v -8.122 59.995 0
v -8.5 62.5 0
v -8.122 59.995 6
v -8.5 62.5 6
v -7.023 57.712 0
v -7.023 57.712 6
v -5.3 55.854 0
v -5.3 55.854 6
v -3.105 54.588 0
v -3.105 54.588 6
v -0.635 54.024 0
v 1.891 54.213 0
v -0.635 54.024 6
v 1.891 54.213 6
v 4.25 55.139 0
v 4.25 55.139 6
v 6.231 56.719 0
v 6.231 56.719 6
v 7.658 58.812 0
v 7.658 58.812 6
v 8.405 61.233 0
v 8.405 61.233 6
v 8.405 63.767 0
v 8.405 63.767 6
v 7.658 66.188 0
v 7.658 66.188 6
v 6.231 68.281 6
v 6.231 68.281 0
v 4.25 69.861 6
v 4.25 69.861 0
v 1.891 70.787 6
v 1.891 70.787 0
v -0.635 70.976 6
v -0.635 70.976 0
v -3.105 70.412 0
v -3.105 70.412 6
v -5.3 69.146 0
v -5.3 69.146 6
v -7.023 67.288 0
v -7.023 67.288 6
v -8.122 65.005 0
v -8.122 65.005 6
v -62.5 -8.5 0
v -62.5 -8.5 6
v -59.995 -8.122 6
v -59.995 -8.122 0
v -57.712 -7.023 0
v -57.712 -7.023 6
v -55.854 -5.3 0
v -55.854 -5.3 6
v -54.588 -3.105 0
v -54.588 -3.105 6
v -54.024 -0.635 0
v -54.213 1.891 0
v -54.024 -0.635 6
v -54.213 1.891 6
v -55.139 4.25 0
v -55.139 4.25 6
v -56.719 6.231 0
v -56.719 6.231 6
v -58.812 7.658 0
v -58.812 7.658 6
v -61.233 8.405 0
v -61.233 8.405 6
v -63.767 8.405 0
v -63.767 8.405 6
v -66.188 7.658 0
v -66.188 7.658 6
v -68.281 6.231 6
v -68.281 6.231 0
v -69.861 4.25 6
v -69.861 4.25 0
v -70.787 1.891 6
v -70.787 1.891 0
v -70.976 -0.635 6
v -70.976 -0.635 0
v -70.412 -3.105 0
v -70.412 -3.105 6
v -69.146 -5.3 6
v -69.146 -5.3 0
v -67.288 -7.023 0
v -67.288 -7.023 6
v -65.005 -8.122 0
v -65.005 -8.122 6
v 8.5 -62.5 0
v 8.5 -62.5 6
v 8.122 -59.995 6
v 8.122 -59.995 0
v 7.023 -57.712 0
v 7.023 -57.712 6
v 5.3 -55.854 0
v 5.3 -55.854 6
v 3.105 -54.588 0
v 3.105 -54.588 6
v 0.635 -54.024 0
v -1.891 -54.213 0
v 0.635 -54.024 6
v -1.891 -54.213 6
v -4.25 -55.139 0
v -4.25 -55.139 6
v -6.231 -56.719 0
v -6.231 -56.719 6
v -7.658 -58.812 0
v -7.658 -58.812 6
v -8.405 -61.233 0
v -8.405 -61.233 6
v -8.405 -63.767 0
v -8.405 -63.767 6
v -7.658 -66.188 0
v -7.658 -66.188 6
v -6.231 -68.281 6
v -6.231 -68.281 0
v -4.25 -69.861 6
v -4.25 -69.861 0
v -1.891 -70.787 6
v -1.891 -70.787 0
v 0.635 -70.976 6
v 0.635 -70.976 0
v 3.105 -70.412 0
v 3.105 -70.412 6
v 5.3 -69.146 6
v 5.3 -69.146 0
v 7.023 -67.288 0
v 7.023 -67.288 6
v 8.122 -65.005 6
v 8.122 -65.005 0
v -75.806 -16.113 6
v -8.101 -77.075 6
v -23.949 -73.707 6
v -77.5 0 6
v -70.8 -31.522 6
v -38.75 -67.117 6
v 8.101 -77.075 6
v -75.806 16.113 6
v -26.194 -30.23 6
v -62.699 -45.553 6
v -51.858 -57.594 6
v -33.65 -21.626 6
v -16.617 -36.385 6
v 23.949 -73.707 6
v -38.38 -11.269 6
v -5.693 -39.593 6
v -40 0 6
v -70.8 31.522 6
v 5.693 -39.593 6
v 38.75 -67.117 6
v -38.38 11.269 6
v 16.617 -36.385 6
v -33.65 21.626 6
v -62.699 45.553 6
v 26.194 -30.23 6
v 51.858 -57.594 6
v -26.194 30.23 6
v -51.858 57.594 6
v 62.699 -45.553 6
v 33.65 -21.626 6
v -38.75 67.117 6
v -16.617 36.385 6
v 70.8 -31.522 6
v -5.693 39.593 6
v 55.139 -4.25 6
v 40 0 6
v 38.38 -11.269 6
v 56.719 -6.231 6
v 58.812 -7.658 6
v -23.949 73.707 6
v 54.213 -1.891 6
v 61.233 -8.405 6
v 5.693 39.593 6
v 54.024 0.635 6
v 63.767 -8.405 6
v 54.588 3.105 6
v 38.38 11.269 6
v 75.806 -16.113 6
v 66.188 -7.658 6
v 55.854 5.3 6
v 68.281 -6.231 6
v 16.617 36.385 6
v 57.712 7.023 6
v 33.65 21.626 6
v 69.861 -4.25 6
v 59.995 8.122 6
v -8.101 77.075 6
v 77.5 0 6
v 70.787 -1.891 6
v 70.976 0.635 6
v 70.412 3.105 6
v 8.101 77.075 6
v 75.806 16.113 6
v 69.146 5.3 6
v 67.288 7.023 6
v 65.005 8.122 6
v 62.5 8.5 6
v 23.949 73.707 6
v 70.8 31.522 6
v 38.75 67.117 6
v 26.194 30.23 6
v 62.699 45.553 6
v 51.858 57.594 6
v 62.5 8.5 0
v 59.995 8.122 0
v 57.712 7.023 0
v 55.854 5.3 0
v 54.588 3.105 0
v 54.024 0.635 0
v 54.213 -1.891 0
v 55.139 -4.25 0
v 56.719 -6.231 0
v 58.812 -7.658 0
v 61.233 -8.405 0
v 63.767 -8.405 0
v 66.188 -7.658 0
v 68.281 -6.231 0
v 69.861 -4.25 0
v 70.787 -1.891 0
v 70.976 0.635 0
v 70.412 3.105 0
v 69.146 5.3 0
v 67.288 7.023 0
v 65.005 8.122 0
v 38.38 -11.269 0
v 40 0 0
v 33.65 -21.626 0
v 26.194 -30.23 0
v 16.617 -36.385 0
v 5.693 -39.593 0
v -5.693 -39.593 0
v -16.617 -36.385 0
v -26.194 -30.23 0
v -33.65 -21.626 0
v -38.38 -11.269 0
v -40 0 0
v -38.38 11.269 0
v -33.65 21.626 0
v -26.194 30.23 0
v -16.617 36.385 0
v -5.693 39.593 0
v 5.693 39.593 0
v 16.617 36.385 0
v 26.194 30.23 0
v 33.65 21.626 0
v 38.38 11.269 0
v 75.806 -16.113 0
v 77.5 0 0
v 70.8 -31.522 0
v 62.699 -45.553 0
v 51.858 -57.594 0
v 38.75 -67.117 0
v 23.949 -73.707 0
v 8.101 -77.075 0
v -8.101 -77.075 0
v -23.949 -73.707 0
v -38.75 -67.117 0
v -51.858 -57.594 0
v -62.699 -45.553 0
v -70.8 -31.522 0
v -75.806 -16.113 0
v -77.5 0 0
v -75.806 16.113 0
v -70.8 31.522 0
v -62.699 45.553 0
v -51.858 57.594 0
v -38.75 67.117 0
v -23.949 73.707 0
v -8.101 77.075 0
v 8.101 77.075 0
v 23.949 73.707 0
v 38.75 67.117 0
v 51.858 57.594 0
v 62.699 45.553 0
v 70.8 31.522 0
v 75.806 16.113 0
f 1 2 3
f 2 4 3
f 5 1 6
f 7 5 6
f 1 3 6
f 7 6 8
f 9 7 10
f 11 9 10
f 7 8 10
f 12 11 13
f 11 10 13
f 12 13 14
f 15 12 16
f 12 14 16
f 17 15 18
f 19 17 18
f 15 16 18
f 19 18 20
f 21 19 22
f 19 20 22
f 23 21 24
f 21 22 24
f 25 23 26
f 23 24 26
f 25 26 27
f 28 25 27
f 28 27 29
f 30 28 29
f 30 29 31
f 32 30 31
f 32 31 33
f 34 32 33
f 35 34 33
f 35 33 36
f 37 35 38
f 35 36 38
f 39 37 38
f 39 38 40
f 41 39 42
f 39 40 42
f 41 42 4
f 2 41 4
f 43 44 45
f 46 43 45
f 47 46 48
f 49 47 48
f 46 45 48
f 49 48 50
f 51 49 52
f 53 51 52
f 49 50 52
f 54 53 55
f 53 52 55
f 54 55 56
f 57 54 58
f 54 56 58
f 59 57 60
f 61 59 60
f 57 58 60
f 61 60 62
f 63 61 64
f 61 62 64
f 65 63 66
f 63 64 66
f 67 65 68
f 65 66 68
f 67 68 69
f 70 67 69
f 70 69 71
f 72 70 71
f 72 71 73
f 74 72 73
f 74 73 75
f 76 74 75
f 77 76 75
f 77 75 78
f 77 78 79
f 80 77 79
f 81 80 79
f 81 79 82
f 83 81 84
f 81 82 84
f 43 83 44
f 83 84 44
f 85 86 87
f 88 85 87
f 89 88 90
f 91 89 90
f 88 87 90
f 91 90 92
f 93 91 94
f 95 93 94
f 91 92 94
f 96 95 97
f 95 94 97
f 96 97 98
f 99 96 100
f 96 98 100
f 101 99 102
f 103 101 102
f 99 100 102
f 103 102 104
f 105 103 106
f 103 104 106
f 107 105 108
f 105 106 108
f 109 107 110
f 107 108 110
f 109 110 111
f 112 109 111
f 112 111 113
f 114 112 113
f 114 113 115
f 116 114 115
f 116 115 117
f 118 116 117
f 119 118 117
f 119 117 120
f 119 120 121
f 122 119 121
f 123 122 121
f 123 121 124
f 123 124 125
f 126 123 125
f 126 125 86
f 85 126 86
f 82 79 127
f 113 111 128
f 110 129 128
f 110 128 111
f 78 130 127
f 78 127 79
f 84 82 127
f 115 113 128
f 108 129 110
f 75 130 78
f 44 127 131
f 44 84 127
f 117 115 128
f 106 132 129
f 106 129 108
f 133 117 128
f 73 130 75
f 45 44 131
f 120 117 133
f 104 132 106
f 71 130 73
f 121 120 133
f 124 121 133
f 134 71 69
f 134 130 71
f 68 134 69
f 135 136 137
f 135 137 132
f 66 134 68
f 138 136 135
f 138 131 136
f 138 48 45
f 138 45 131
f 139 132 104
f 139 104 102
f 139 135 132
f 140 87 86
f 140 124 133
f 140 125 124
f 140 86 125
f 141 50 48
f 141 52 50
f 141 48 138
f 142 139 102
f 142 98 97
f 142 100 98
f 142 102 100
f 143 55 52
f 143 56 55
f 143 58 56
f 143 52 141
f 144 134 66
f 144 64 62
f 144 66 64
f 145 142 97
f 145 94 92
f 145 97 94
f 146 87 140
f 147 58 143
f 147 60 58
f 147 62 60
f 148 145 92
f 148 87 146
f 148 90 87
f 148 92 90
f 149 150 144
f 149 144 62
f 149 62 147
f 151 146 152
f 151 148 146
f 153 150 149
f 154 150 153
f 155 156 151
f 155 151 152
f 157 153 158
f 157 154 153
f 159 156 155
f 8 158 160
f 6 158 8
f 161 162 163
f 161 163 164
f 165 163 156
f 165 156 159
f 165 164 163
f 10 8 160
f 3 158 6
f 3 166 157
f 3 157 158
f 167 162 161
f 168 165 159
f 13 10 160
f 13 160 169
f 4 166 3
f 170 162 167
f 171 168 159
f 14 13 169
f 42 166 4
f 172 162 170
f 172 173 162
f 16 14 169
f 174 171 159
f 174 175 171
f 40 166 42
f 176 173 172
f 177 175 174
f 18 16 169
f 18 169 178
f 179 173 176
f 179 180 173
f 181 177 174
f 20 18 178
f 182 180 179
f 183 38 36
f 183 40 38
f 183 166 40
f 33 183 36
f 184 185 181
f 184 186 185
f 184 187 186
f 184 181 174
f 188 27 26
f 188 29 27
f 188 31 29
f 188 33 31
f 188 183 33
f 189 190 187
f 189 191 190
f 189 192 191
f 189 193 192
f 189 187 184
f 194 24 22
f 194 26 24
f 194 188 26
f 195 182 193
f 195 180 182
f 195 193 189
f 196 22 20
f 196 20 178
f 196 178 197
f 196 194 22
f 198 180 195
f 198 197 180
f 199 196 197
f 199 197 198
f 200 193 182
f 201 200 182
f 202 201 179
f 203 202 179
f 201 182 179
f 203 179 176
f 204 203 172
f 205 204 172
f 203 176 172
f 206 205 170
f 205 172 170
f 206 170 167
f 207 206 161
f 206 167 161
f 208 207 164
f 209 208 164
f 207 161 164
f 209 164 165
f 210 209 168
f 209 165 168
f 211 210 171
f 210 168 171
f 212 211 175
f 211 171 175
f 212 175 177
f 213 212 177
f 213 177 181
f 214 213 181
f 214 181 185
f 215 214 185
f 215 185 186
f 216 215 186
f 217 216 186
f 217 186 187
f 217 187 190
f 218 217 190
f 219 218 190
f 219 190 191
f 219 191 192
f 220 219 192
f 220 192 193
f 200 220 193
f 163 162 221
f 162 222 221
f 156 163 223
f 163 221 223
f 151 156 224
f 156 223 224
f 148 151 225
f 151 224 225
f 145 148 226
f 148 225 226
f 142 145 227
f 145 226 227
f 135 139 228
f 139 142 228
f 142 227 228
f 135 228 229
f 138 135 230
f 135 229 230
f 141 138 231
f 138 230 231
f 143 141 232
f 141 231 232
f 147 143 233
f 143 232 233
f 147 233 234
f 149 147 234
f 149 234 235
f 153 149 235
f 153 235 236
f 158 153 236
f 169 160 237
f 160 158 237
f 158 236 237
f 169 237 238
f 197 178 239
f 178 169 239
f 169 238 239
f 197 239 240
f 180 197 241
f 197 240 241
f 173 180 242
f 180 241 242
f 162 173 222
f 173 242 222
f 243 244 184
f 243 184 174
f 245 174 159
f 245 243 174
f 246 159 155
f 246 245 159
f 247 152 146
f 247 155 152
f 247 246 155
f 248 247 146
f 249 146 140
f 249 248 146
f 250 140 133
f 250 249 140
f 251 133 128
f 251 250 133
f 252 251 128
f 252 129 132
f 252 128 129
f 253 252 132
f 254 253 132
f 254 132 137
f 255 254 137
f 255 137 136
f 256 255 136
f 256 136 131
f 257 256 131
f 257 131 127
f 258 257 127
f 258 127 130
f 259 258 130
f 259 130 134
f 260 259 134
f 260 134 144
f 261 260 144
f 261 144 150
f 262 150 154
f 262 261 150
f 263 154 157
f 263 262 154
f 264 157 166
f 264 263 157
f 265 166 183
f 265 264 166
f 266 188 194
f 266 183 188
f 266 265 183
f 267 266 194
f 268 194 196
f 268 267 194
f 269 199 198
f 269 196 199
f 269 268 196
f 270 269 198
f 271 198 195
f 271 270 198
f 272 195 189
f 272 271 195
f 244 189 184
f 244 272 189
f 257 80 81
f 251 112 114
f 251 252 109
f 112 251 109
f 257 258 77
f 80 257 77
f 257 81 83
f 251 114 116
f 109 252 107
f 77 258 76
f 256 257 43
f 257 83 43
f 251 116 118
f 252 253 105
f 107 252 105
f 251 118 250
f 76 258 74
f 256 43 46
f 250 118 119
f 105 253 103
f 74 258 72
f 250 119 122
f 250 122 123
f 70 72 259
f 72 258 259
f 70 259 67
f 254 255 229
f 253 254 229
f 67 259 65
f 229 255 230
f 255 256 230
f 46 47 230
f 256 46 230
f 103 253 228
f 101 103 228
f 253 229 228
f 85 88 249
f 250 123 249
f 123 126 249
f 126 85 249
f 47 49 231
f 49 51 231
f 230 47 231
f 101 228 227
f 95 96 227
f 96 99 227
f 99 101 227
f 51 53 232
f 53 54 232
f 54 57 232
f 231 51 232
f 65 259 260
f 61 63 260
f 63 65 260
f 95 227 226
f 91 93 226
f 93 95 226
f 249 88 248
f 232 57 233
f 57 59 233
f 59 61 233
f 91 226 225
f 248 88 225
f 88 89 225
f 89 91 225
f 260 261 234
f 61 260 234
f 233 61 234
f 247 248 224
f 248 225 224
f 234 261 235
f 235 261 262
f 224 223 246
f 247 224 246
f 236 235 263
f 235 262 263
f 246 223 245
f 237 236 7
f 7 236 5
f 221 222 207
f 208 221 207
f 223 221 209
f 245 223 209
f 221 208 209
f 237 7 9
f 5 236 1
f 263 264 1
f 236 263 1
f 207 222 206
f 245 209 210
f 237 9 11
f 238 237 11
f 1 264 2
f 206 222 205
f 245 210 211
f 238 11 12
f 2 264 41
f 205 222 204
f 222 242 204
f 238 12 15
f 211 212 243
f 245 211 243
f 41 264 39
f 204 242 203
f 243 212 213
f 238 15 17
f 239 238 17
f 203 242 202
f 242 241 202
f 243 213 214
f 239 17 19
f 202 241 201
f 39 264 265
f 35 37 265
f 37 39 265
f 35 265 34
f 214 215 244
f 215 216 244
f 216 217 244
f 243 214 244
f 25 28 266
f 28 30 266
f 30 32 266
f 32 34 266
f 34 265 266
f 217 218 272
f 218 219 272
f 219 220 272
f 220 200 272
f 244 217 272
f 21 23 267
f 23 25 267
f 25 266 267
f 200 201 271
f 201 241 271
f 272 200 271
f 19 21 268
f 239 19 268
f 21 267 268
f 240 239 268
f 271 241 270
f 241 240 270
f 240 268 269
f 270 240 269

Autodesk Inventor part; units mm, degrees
ref_plane "YZ Plane" through (0, 0, 0) normal (1, 0, 0) x (0, 1, 0)
ref_plane "XZ Plane" through (0, 0, 0) normal (0, 1, 0) x (-1, 0, 0)
ref_plane "XY Plane" through (0, 0, 0) normal (0, 0, 1) x (1, 0, 0)
sketch "Sketch1" plane through (0, 0, 0) normal (0, 0, 1) x (1, 0, 0)
  circle A0 centre (0, 0) radius 77.5
  circle A1 centre (0, 0) radius 40
  dimension "d22" = 155
  dimension "d23" = 80
extrude "Plate1" add sketch "Sketch1" along normal blind 6
sketch "Sketch5" plane through (0, 0, 6) normal (0, 0, 1) x (1, 0, 0)
  circle A0 centre (0, -62.5) radius 8.5
  point P0 (0, 0)
  dimension "d24" = 62.5
  dimension "d25" = 17
extrude "Cut1" cut sketch "Sketch5" against normal blind 6
pattern_circular "Circular Pattern1" count 4 over 360 about axis through (0, 0, 0) along (0, 0, 1) of "Cut1"
equation "\"d26\" = Thickness"
equation "\"d2\" = Thickness"
equation "\"BendReliefWidth\" = Thickness"
equation "\"BendReliefDepth\" = 0.5 * Thickness"
equation "\"CornerReliefSize\" = 4 * Thickness"
equation "\"MinimumRemnant\" = 2 * Thickness"
equation "\"TransitionRadius\" = BendRadius"
equation "\"JacobiRadiusSize\" = BendRadius"
equation "\"GapSize\" = Thickness"
equation "\"Thickness\" = 6"
equation "\"BendRadius\" = 5"
properties part number "Flange DN 50" material "Steel"
